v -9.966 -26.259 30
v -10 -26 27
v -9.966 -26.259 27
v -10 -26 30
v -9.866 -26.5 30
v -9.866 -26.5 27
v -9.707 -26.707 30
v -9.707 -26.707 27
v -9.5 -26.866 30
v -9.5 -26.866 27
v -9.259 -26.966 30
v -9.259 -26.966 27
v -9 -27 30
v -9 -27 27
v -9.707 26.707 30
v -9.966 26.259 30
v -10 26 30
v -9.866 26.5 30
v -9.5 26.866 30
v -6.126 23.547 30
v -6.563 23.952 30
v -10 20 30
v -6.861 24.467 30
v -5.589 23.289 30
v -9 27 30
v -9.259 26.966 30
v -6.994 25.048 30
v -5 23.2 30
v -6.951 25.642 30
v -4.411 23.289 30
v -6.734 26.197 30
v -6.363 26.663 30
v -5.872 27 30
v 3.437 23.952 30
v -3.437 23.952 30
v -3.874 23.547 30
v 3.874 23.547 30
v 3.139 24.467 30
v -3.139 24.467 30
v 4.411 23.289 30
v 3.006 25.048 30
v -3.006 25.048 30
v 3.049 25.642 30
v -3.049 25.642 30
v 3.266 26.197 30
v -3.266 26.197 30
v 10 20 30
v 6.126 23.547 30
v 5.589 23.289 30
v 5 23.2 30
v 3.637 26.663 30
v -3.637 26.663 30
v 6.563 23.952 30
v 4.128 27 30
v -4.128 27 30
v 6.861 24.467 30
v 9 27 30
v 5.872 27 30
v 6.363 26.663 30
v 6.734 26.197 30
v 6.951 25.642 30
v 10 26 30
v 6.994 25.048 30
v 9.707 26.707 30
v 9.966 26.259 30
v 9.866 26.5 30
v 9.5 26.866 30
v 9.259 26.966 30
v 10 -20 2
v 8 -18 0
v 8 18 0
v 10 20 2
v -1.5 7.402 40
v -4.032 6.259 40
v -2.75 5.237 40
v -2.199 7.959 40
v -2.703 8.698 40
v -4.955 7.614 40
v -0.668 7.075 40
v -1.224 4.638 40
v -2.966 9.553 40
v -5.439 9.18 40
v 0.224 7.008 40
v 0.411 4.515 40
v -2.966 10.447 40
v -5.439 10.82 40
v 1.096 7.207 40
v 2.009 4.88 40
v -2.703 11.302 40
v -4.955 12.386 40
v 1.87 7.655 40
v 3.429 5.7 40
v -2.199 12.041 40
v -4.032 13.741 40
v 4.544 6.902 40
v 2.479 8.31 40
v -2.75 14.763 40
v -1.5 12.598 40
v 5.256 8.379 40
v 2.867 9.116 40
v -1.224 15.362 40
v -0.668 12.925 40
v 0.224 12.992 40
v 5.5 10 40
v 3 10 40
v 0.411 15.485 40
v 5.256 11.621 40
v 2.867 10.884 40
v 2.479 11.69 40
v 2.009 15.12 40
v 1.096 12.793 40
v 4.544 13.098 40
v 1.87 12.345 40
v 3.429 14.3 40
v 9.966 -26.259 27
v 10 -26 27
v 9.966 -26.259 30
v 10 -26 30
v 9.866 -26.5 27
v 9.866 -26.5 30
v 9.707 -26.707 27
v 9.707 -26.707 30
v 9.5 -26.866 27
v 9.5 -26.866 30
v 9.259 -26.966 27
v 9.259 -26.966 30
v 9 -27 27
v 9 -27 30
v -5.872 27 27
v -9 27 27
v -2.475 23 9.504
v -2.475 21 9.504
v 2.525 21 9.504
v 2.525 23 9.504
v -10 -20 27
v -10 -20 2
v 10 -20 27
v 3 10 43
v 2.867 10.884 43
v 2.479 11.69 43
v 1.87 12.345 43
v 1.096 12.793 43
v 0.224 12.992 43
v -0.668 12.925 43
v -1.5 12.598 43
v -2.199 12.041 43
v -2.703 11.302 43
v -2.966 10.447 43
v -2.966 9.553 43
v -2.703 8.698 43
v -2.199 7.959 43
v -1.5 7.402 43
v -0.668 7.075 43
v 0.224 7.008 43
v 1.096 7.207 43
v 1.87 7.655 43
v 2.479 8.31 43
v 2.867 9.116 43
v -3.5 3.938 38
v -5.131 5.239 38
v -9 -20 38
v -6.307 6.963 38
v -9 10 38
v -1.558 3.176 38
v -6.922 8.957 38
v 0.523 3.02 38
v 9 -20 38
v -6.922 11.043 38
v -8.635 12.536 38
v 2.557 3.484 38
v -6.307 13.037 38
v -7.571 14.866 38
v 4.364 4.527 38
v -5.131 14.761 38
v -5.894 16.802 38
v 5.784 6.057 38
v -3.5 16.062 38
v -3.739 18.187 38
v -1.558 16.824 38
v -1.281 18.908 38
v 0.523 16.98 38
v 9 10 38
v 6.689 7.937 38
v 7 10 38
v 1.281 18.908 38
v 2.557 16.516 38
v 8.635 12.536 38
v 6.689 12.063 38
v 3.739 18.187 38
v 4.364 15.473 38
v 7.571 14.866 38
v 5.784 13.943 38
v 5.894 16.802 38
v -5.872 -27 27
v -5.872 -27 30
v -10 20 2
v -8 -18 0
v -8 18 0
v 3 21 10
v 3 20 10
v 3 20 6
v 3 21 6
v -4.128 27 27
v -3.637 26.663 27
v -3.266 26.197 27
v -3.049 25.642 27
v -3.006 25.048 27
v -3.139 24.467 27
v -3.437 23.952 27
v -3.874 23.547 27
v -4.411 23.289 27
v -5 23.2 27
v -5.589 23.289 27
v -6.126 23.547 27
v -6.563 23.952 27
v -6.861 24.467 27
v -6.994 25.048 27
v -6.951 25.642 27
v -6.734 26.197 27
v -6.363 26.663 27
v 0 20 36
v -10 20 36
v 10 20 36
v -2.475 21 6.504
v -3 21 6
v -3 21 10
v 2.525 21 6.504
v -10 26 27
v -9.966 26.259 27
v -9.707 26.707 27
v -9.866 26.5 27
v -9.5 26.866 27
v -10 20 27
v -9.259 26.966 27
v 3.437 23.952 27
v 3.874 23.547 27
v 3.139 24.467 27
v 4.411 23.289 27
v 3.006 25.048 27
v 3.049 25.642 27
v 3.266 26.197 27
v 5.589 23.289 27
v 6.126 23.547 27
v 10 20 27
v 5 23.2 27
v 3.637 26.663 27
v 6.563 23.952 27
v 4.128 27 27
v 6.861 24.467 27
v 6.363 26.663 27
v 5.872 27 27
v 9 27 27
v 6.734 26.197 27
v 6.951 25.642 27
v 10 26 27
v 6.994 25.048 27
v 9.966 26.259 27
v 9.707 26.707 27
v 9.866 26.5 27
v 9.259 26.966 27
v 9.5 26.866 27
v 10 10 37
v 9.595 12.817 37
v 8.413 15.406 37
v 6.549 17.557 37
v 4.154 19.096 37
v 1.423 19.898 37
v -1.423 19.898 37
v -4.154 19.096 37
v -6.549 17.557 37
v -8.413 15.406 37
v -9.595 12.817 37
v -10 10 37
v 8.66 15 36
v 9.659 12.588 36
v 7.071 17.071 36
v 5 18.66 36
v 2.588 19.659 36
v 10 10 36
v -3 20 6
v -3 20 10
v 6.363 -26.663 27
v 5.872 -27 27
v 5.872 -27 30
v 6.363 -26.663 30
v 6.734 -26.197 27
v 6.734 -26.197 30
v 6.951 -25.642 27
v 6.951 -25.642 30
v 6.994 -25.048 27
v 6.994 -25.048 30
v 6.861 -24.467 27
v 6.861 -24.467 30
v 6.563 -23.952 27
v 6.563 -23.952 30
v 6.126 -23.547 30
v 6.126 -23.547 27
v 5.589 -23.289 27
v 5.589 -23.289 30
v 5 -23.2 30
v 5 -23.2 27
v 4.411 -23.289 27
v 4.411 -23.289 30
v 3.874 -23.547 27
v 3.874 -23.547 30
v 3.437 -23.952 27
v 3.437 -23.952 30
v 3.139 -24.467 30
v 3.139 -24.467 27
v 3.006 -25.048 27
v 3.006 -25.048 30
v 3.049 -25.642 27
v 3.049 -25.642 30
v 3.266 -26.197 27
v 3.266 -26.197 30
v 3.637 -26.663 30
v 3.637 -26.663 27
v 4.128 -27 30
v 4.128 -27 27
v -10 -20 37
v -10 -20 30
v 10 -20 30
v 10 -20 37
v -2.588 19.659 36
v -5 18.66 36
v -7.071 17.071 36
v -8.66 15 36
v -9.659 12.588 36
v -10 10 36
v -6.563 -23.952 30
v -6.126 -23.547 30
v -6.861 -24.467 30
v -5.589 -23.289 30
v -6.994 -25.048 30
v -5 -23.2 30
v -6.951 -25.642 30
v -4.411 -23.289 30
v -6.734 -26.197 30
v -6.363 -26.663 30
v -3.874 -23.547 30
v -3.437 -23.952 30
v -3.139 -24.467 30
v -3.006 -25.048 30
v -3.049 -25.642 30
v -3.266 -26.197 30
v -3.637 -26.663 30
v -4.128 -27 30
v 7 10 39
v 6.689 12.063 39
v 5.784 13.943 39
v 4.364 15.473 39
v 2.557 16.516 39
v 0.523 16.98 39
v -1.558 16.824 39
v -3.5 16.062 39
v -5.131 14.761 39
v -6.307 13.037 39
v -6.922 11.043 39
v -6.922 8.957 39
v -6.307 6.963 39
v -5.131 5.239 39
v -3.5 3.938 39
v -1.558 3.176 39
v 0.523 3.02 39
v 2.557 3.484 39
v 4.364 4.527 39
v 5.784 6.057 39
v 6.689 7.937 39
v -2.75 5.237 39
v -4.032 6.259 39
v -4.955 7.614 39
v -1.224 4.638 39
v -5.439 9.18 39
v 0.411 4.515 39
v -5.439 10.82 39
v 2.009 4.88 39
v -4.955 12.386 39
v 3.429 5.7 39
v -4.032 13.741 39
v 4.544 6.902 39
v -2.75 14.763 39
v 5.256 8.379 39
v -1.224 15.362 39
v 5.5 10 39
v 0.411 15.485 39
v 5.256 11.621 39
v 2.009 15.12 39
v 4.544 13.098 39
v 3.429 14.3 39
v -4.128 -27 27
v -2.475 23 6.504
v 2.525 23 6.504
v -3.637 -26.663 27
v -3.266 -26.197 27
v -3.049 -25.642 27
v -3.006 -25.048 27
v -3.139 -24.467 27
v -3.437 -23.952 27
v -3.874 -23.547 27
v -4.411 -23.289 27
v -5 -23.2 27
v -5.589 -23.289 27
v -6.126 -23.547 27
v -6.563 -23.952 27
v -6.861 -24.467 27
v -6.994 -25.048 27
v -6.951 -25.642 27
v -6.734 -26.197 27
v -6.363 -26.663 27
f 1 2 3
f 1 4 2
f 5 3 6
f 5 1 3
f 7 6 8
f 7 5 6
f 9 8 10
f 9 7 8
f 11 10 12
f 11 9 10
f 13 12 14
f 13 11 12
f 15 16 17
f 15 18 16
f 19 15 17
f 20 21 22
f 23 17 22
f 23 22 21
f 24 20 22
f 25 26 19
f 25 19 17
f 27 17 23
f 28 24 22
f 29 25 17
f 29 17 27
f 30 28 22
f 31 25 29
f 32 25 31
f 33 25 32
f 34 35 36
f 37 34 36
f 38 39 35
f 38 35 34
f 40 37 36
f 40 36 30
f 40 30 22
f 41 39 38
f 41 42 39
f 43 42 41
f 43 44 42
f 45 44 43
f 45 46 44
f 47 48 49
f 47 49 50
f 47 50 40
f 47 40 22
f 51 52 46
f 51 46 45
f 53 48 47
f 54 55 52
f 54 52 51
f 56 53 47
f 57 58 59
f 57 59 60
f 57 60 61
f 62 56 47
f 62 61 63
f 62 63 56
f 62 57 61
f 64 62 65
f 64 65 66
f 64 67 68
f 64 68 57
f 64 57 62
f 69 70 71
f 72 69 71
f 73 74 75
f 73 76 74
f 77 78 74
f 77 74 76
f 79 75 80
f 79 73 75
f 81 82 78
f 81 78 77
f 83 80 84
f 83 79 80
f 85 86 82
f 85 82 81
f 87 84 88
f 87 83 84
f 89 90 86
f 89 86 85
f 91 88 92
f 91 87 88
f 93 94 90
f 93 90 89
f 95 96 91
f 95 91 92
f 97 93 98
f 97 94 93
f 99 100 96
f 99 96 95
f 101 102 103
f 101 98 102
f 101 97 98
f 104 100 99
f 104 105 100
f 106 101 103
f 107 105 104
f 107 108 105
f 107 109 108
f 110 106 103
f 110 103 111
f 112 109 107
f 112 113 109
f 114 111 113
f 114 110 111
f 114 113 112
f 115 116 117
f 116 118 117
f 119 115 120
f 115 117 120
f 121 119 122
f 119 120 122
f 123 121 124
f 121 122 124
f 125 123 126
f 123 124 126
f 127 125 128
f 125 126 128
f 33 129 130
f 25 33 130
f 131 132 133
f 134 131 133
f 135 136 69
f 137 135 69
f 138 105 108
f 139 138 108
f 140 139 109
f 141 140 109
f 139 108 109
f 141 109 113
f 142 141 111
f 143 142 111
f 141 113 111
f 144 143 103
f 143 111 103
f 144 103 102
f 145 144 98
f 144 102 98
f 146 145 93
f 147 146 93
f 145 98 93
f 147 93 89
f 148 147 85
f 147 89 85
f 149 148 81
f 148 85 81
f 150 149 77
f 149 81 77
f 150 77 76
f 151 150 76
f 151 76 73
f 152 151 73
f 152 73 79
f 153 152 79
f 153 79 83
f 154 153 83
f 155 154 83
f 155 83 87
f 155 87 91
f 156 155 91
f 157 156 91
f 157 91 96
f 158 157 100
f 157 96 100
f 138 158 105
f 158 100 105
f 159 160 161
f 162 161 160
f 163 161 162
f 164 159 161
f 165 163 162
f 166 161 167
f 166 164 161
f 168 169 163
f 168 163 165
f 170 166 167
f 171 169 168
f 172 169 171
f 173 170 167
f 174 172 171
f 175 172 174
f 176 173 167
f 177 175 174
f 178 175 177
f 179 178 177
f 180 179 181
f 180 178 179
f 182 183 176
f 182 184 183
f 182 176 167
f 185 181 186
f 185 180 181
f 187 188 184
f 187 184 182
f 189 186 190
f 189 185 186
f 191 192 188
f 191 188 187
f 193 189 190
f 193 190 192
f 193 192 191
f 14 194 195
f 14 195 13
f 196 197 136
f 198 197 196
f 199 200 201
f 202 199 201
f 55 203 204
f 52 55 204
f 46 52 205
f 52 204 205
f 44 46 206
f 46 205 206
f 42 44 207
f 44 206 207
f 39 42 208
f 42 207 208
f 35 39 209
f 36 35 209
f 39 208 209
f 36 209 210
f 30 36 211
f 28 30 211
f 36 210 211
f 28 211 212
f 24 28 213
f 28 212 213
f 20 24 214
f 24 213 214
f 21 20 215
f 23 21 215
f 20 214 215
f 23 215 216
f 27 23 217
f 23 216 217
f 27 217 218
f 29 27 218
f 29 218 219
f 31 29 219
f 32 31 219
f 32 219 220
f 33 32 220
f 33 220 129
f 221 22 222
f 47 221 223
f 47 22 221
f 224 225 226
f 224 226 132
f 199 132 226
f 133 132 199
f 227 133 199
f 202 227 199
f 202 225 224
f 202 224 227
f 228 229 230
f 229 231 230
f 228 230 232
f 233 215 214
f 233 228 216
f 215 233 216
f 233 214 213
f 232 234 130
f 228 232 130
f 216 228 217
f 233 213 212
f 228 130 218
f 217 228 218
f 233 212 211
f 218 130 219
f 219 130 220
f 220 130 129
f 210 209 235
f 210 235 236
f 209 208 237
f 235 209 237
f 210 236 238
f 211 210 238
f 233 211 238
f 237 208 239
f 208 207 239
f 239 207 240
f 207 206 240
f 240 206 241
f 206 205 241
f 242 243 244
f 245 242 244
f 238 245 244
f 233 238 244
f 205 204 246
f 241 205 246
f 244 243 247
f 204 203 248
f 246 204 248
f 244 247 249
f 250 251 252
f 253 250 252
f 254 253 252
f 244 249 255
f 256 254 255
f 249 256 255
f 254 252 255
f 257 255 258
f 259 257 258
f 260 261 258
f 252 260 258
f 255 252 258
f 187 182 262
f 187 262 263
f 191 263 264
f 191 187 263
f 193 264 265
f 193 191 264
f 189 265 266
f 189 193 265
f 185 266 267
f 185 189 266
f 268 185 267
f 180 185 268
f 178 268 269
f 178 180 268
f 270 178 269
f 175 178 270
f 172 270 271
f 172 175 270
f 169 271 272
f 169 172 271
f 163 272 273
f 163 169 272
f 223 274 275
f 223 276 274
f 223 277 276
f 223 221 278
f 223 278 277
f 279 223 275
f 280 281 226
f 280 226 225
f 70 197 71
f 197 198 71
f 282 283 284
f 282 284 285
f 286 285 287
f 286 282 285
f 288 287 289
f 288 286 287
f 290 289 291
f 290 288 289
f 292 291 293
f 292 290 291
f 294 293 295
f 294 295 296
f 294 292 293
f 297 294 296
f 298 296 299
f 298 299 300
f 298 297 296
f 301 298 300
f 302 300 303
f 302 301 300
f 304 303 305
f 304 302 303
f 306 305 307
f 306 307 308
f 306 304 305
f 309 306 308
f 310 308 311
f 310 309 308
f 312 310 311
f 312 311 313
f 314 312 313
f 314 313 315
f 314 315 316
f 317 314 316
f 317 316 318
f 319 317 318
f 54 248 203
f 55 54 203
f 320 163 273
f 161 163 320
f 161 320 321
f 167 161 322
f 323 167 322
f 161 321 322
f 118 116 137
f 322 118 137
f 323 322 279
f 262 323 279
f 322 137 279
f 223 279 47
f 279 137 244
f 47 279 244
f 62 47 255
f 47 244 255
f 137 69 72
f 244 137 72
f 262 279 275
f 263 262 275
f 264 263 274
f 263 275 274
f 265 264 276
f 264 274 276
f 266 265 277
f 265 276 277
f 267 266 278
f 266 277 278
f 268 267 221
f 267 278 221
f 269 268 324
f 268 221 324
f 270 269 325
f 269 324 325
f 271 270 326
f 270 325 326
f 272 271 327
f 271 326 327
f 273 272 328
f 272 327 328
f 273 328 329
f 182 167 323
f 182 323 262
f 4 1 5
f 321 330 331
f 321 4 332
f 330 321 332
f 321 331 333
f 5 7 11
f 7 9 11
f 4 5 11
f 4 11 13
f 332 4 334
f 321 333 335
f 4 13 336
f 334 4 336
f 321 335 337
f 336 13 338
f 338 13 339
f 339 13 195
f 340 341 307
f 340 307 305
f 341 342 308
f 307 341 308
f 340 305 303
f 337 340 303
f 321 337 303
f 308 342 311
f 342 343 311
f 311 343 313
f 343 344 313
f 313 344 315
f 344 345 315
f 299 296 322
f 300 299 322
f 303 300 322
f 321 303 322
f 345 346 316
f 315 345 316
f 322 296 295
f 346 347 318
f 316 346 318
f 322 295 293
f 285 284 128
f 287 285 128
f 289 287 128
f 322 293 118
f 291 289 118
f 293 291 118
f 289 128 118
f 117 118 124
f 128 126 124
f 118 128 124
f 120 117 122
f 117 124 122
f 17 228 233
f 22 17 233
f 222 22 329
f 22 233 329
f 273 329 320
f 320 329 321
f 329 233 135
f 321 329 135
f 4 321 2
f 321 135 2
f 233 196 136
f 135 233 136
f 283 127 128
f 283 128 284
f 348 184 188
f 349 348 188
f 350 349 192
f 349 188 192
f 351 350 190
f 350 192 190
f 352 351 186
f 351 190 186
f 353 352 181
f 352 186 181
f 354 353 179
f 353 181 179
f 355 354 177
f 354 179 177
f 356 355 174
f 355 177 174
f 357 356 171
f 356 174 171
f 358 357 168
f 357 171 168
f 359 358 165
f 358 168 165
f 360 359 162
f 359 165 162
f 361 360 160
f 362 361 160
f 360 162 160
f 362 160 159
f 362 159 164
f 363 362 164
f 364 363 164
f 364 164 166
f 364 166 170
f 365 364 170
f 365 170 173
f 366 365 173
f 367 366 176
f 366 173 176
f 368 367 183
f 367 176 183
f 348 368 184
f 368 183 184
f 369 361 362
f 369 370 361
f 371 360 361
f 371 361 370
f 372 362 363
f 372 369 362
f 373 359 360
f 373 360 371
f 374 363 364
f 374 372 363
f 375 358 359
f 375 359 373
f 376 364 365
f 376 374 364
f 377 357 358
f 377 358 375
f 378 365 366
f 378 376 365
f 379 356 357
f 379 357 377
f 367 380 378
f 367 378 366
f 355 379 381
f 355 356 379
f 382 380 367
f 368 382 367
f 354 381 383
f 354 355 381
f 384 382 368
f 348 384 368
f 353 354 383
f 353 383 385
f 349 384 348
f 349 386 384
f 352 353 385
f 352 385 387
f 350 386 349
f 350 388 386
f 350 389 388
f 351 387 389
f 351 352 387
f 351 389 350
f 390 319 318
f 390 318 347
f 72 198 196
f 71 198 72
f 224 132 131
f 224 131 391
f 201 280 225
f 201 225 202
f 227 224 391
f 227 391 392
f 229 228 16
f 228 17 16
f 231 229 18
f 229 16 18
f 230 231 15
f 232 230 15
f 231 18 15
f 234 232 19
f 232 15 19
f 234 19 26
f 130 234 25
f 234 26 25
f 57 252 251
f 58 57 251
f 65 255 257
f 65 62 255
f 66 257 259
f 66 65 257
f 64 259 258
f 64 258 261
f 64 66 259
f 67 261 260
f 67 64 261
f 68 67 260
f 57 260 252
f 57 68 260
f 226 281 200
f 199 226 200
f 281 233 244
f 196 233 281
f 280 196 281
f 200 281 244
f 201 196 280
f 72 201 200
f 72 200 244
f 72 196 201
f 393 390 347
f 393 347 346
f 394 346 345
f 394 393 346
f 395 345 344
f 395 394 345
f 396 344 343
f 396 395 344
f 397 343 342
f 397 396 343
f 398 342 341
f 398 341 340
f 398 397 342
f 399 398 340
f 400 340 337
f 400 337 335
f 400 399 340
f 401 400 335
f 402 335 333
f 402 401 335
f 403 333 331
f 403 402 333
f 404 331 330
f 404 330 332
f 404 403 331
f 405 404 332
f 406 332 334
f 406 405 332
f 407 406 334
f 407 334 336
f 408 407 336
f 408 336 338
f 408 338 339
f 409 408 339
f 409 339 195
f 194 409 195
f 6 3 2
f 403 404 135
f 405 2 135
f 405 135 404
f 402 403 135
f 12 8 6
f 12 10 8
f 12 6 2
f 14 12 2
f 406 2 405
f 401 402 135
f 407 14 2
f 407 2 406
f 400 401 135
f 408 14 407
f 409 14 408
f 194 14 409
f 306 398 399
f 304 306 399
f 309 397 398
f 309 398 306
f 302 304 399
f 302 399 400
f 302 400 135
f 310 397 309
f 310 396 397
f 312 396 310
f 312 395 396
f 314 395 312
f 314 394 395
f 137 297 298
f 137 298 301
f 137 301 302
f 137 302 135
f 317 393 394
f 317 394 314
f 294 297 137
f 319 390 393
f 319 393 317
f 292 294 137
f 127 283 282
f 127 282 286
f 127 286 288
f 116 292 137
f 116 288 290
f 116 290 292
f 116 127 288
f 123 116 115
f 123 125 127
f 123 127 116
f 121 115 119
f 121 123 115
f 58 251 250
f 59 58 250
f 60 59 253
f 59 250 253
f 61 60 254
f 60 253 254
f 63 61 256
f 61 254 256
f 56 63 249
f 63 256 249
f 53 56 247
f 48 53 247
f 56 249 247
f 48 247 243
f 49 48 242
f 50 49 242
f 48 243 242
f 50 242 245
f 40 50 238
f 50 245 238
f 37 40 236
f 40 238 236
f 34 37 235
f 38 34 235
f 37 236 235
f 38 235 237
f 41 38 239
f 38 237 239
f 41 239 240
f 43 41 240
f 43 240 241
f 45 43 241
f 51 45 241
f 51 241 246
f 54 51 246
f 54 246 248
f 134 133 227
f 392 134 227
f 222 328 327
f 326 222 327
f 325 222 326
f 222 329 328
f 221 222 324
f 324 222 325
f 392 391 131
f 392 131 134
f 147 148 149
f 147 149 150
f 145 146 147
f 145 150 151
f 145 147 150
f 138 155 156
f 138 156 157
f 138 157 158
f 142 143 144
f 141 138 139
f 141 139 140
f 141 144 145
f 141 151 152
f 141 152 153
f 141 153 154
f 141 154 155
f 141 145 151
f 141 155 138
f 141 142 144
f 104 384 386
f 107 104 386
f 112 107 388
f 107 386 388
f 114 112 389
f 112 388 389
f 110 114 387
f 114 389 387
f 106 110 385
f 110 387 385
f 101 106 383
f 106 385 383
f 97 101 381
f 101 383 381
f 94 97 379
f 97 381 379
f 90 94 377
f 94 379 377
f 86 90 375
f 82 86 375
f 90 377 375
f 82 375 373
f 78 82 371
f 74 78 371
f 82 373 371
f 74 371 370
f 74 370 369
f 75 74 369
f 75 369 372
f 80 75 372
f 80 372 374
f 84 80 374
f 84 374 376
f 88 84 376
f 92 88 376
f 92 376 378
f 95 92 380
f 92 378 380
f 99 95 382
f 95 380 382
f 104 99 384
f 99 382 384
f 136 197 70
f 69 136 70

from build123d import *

# Parameters (mm, degrees)
SKETCH1_W            = 20
SKETCH1_H            = 40
BOSS_EXTRUDE1_DEPTH  = 36
CHAMFER1_SIZE        = 2
BOSS_EXTRUDE7_DEPTH  = 3
FILLET1_R            = 1
FILLET2_R            = 1
SKETCH3_W            = 6
SKETCH3_H            = 4
BOSS_EXTRUDE8_DEPTH  = 1
SKETCH4_W            = 5
SKETCH4_H            = 3
BOSS_EXTRUDE9_DEPTH  = 2
BOSS_EXTRUDE10_DEPTH = 2
CHAMFER2_SIZE        = 1
SKETCH6_R            = 7
BOSS_EXTRUDE11_DEPTH = 1
SKETCH7_R            = 5.5
BOSS_EXTRUDE12_DEPTH = 1
SKETCH8_R            = 3
BOSS_EXTRUDE13_DEPTH = 3


with BuildPart() as part:
    # Sketch1 → Boss-Extrude1 (new body)
    with BuildSketch(Plane.XY):
        Rectangle(SKETCH1_W, SKETCH1_H)
    extrude(amount=BOSS_EXTRUDE1_DEPTH)

    # Chamfer1
    chamfer1_edges = [part.edges().sort_by_distance(p)[0] for p in [
        (0, -20, 0),
        (-10, 0, 0),
        (0, 20, 0),
        (10, 0, 0),
    ]]
    chamfer(chamfer1_edges, length=CHAMFER1_SIZE)

    # Sketch2 → Boss-Extrude7 (add)
    with BuildSketch(Plane.XY.offset(27)):
        with BuildLine():
            Line((-10, 20), (10, 20))
            Line((10, 20), (10, 27))
            Line((10, 27), (5.871779789, 27))
            ThreePointArc((5.871779789, 27), (5, 23.2), (4.128220211, 27))
            Line((4.128220211, 27), (-4.128220211, 27))
            ThreePointArc((-4.128220211, 27), (-5, 23.2), (-5.871779789, 27))
            Line((-5.871779789, 27), (-10, 27))
            Line((-10, 27), (-10, 20))
        make_face()
    boss_extrude7 = extrude(amount=BOSS_EXTRUDE7_DEPTH)

    # Fillet1
    fillet1_edges = [part.edges().sort_by_distance(p)[0] for p in [
        (10, 27, 28.5),
        (-10, 27, 28.5),
    ]]
    fillet(fillet1_edges, radius=FILLET1_R)

    # Mirror1: Boss-Extrude7 across plane
    add(boss_extrude7.mirror(Plane.ZX))

    # Fillet2
    fillet2_edges = [part.edges().sort_by_distance(p)[0] for p in [
        (-10, -27, 28.5),
        (10, -27, 28.5),
    ]]
    fillet(fillet2_edges, radius=FILLET2_R)

    # Sketch3 → Boss-Extrude8 (add)
    with BuildSketch(Plane(origin=(0, 20, 0), x_dir=(1, 0, 0), z_dir=(0, 1, 0))):
        with Locations((0, -8)):
            Rectangle(SKETCH3_W, SKETCH3_H)
    extrude(amount=BOSS_EXTRUDE8_DEPTH)

    # Sketch4 → Boss-Extrude9 (add)
    with BuildSketch(Plane(origin=(0, 21, 0), x_dir=(1, 0, 0), z_dir=(0, 1, 0))):
        with Locations((0.024838868, -8.004270903)):
            Rectangle(SKETCH4_W, SKETCH4_H)
    extrude(amount=BOSS_EXTRUDE9_DEPTH)

    # Sketch5 → Boss-Extrude10 (add)
    with BuildSketch(Plane.XY.offset(36)):
        with BuildLine():
            Line((-10, 10), (-10, -20))
            Line((-10, -20), (10, -20))
            Line((10, -20), (10, 10))
            ThreePointArc((10, 10), (0, 20), (-10, 10))
        make_face()
    extrude(amount=BOSS_EXTRUDE10_DEPTH)

    # Chamfer2
    chamfer2_edges = [part.edges().sort_by_distance(p)[0] for p in [
        (10, -5, 38),
        (0, 20, 38),
        (-10, -5, 38),
    ]]
    chamfer(chamfer2_edges, length=CHAMFER2_SIZE)

    # Sketch6 → Boss-Extrude11 (add)
    with BuildSketch(Plane.XY.offset(38)):
        with Locations((0, 10)):
            Circle(SKETCH6_R)
    extrude(amount=BOSS_EXTRUDE11_DEPTH)

    # Sketch7 → Boss-Extrude12 (add)
    with BuildSketch(Plane.XY.offset(39)):
        with Locations((0, 10)):
            Circle(SKETCH7_R)
    extrude(amount=BOSS_EXTRUDE12_DEPTH)

    # Sketch8 → Boss-Extrude13 (add)
    with BuildSketch(Plane.XY.offset(40)):
        with Locations((0, 10)):
            Circle(SKETCH8_R)
    extrude(amount=BOSS_EXTRUDE13_DEPTH)


solid = part.part
